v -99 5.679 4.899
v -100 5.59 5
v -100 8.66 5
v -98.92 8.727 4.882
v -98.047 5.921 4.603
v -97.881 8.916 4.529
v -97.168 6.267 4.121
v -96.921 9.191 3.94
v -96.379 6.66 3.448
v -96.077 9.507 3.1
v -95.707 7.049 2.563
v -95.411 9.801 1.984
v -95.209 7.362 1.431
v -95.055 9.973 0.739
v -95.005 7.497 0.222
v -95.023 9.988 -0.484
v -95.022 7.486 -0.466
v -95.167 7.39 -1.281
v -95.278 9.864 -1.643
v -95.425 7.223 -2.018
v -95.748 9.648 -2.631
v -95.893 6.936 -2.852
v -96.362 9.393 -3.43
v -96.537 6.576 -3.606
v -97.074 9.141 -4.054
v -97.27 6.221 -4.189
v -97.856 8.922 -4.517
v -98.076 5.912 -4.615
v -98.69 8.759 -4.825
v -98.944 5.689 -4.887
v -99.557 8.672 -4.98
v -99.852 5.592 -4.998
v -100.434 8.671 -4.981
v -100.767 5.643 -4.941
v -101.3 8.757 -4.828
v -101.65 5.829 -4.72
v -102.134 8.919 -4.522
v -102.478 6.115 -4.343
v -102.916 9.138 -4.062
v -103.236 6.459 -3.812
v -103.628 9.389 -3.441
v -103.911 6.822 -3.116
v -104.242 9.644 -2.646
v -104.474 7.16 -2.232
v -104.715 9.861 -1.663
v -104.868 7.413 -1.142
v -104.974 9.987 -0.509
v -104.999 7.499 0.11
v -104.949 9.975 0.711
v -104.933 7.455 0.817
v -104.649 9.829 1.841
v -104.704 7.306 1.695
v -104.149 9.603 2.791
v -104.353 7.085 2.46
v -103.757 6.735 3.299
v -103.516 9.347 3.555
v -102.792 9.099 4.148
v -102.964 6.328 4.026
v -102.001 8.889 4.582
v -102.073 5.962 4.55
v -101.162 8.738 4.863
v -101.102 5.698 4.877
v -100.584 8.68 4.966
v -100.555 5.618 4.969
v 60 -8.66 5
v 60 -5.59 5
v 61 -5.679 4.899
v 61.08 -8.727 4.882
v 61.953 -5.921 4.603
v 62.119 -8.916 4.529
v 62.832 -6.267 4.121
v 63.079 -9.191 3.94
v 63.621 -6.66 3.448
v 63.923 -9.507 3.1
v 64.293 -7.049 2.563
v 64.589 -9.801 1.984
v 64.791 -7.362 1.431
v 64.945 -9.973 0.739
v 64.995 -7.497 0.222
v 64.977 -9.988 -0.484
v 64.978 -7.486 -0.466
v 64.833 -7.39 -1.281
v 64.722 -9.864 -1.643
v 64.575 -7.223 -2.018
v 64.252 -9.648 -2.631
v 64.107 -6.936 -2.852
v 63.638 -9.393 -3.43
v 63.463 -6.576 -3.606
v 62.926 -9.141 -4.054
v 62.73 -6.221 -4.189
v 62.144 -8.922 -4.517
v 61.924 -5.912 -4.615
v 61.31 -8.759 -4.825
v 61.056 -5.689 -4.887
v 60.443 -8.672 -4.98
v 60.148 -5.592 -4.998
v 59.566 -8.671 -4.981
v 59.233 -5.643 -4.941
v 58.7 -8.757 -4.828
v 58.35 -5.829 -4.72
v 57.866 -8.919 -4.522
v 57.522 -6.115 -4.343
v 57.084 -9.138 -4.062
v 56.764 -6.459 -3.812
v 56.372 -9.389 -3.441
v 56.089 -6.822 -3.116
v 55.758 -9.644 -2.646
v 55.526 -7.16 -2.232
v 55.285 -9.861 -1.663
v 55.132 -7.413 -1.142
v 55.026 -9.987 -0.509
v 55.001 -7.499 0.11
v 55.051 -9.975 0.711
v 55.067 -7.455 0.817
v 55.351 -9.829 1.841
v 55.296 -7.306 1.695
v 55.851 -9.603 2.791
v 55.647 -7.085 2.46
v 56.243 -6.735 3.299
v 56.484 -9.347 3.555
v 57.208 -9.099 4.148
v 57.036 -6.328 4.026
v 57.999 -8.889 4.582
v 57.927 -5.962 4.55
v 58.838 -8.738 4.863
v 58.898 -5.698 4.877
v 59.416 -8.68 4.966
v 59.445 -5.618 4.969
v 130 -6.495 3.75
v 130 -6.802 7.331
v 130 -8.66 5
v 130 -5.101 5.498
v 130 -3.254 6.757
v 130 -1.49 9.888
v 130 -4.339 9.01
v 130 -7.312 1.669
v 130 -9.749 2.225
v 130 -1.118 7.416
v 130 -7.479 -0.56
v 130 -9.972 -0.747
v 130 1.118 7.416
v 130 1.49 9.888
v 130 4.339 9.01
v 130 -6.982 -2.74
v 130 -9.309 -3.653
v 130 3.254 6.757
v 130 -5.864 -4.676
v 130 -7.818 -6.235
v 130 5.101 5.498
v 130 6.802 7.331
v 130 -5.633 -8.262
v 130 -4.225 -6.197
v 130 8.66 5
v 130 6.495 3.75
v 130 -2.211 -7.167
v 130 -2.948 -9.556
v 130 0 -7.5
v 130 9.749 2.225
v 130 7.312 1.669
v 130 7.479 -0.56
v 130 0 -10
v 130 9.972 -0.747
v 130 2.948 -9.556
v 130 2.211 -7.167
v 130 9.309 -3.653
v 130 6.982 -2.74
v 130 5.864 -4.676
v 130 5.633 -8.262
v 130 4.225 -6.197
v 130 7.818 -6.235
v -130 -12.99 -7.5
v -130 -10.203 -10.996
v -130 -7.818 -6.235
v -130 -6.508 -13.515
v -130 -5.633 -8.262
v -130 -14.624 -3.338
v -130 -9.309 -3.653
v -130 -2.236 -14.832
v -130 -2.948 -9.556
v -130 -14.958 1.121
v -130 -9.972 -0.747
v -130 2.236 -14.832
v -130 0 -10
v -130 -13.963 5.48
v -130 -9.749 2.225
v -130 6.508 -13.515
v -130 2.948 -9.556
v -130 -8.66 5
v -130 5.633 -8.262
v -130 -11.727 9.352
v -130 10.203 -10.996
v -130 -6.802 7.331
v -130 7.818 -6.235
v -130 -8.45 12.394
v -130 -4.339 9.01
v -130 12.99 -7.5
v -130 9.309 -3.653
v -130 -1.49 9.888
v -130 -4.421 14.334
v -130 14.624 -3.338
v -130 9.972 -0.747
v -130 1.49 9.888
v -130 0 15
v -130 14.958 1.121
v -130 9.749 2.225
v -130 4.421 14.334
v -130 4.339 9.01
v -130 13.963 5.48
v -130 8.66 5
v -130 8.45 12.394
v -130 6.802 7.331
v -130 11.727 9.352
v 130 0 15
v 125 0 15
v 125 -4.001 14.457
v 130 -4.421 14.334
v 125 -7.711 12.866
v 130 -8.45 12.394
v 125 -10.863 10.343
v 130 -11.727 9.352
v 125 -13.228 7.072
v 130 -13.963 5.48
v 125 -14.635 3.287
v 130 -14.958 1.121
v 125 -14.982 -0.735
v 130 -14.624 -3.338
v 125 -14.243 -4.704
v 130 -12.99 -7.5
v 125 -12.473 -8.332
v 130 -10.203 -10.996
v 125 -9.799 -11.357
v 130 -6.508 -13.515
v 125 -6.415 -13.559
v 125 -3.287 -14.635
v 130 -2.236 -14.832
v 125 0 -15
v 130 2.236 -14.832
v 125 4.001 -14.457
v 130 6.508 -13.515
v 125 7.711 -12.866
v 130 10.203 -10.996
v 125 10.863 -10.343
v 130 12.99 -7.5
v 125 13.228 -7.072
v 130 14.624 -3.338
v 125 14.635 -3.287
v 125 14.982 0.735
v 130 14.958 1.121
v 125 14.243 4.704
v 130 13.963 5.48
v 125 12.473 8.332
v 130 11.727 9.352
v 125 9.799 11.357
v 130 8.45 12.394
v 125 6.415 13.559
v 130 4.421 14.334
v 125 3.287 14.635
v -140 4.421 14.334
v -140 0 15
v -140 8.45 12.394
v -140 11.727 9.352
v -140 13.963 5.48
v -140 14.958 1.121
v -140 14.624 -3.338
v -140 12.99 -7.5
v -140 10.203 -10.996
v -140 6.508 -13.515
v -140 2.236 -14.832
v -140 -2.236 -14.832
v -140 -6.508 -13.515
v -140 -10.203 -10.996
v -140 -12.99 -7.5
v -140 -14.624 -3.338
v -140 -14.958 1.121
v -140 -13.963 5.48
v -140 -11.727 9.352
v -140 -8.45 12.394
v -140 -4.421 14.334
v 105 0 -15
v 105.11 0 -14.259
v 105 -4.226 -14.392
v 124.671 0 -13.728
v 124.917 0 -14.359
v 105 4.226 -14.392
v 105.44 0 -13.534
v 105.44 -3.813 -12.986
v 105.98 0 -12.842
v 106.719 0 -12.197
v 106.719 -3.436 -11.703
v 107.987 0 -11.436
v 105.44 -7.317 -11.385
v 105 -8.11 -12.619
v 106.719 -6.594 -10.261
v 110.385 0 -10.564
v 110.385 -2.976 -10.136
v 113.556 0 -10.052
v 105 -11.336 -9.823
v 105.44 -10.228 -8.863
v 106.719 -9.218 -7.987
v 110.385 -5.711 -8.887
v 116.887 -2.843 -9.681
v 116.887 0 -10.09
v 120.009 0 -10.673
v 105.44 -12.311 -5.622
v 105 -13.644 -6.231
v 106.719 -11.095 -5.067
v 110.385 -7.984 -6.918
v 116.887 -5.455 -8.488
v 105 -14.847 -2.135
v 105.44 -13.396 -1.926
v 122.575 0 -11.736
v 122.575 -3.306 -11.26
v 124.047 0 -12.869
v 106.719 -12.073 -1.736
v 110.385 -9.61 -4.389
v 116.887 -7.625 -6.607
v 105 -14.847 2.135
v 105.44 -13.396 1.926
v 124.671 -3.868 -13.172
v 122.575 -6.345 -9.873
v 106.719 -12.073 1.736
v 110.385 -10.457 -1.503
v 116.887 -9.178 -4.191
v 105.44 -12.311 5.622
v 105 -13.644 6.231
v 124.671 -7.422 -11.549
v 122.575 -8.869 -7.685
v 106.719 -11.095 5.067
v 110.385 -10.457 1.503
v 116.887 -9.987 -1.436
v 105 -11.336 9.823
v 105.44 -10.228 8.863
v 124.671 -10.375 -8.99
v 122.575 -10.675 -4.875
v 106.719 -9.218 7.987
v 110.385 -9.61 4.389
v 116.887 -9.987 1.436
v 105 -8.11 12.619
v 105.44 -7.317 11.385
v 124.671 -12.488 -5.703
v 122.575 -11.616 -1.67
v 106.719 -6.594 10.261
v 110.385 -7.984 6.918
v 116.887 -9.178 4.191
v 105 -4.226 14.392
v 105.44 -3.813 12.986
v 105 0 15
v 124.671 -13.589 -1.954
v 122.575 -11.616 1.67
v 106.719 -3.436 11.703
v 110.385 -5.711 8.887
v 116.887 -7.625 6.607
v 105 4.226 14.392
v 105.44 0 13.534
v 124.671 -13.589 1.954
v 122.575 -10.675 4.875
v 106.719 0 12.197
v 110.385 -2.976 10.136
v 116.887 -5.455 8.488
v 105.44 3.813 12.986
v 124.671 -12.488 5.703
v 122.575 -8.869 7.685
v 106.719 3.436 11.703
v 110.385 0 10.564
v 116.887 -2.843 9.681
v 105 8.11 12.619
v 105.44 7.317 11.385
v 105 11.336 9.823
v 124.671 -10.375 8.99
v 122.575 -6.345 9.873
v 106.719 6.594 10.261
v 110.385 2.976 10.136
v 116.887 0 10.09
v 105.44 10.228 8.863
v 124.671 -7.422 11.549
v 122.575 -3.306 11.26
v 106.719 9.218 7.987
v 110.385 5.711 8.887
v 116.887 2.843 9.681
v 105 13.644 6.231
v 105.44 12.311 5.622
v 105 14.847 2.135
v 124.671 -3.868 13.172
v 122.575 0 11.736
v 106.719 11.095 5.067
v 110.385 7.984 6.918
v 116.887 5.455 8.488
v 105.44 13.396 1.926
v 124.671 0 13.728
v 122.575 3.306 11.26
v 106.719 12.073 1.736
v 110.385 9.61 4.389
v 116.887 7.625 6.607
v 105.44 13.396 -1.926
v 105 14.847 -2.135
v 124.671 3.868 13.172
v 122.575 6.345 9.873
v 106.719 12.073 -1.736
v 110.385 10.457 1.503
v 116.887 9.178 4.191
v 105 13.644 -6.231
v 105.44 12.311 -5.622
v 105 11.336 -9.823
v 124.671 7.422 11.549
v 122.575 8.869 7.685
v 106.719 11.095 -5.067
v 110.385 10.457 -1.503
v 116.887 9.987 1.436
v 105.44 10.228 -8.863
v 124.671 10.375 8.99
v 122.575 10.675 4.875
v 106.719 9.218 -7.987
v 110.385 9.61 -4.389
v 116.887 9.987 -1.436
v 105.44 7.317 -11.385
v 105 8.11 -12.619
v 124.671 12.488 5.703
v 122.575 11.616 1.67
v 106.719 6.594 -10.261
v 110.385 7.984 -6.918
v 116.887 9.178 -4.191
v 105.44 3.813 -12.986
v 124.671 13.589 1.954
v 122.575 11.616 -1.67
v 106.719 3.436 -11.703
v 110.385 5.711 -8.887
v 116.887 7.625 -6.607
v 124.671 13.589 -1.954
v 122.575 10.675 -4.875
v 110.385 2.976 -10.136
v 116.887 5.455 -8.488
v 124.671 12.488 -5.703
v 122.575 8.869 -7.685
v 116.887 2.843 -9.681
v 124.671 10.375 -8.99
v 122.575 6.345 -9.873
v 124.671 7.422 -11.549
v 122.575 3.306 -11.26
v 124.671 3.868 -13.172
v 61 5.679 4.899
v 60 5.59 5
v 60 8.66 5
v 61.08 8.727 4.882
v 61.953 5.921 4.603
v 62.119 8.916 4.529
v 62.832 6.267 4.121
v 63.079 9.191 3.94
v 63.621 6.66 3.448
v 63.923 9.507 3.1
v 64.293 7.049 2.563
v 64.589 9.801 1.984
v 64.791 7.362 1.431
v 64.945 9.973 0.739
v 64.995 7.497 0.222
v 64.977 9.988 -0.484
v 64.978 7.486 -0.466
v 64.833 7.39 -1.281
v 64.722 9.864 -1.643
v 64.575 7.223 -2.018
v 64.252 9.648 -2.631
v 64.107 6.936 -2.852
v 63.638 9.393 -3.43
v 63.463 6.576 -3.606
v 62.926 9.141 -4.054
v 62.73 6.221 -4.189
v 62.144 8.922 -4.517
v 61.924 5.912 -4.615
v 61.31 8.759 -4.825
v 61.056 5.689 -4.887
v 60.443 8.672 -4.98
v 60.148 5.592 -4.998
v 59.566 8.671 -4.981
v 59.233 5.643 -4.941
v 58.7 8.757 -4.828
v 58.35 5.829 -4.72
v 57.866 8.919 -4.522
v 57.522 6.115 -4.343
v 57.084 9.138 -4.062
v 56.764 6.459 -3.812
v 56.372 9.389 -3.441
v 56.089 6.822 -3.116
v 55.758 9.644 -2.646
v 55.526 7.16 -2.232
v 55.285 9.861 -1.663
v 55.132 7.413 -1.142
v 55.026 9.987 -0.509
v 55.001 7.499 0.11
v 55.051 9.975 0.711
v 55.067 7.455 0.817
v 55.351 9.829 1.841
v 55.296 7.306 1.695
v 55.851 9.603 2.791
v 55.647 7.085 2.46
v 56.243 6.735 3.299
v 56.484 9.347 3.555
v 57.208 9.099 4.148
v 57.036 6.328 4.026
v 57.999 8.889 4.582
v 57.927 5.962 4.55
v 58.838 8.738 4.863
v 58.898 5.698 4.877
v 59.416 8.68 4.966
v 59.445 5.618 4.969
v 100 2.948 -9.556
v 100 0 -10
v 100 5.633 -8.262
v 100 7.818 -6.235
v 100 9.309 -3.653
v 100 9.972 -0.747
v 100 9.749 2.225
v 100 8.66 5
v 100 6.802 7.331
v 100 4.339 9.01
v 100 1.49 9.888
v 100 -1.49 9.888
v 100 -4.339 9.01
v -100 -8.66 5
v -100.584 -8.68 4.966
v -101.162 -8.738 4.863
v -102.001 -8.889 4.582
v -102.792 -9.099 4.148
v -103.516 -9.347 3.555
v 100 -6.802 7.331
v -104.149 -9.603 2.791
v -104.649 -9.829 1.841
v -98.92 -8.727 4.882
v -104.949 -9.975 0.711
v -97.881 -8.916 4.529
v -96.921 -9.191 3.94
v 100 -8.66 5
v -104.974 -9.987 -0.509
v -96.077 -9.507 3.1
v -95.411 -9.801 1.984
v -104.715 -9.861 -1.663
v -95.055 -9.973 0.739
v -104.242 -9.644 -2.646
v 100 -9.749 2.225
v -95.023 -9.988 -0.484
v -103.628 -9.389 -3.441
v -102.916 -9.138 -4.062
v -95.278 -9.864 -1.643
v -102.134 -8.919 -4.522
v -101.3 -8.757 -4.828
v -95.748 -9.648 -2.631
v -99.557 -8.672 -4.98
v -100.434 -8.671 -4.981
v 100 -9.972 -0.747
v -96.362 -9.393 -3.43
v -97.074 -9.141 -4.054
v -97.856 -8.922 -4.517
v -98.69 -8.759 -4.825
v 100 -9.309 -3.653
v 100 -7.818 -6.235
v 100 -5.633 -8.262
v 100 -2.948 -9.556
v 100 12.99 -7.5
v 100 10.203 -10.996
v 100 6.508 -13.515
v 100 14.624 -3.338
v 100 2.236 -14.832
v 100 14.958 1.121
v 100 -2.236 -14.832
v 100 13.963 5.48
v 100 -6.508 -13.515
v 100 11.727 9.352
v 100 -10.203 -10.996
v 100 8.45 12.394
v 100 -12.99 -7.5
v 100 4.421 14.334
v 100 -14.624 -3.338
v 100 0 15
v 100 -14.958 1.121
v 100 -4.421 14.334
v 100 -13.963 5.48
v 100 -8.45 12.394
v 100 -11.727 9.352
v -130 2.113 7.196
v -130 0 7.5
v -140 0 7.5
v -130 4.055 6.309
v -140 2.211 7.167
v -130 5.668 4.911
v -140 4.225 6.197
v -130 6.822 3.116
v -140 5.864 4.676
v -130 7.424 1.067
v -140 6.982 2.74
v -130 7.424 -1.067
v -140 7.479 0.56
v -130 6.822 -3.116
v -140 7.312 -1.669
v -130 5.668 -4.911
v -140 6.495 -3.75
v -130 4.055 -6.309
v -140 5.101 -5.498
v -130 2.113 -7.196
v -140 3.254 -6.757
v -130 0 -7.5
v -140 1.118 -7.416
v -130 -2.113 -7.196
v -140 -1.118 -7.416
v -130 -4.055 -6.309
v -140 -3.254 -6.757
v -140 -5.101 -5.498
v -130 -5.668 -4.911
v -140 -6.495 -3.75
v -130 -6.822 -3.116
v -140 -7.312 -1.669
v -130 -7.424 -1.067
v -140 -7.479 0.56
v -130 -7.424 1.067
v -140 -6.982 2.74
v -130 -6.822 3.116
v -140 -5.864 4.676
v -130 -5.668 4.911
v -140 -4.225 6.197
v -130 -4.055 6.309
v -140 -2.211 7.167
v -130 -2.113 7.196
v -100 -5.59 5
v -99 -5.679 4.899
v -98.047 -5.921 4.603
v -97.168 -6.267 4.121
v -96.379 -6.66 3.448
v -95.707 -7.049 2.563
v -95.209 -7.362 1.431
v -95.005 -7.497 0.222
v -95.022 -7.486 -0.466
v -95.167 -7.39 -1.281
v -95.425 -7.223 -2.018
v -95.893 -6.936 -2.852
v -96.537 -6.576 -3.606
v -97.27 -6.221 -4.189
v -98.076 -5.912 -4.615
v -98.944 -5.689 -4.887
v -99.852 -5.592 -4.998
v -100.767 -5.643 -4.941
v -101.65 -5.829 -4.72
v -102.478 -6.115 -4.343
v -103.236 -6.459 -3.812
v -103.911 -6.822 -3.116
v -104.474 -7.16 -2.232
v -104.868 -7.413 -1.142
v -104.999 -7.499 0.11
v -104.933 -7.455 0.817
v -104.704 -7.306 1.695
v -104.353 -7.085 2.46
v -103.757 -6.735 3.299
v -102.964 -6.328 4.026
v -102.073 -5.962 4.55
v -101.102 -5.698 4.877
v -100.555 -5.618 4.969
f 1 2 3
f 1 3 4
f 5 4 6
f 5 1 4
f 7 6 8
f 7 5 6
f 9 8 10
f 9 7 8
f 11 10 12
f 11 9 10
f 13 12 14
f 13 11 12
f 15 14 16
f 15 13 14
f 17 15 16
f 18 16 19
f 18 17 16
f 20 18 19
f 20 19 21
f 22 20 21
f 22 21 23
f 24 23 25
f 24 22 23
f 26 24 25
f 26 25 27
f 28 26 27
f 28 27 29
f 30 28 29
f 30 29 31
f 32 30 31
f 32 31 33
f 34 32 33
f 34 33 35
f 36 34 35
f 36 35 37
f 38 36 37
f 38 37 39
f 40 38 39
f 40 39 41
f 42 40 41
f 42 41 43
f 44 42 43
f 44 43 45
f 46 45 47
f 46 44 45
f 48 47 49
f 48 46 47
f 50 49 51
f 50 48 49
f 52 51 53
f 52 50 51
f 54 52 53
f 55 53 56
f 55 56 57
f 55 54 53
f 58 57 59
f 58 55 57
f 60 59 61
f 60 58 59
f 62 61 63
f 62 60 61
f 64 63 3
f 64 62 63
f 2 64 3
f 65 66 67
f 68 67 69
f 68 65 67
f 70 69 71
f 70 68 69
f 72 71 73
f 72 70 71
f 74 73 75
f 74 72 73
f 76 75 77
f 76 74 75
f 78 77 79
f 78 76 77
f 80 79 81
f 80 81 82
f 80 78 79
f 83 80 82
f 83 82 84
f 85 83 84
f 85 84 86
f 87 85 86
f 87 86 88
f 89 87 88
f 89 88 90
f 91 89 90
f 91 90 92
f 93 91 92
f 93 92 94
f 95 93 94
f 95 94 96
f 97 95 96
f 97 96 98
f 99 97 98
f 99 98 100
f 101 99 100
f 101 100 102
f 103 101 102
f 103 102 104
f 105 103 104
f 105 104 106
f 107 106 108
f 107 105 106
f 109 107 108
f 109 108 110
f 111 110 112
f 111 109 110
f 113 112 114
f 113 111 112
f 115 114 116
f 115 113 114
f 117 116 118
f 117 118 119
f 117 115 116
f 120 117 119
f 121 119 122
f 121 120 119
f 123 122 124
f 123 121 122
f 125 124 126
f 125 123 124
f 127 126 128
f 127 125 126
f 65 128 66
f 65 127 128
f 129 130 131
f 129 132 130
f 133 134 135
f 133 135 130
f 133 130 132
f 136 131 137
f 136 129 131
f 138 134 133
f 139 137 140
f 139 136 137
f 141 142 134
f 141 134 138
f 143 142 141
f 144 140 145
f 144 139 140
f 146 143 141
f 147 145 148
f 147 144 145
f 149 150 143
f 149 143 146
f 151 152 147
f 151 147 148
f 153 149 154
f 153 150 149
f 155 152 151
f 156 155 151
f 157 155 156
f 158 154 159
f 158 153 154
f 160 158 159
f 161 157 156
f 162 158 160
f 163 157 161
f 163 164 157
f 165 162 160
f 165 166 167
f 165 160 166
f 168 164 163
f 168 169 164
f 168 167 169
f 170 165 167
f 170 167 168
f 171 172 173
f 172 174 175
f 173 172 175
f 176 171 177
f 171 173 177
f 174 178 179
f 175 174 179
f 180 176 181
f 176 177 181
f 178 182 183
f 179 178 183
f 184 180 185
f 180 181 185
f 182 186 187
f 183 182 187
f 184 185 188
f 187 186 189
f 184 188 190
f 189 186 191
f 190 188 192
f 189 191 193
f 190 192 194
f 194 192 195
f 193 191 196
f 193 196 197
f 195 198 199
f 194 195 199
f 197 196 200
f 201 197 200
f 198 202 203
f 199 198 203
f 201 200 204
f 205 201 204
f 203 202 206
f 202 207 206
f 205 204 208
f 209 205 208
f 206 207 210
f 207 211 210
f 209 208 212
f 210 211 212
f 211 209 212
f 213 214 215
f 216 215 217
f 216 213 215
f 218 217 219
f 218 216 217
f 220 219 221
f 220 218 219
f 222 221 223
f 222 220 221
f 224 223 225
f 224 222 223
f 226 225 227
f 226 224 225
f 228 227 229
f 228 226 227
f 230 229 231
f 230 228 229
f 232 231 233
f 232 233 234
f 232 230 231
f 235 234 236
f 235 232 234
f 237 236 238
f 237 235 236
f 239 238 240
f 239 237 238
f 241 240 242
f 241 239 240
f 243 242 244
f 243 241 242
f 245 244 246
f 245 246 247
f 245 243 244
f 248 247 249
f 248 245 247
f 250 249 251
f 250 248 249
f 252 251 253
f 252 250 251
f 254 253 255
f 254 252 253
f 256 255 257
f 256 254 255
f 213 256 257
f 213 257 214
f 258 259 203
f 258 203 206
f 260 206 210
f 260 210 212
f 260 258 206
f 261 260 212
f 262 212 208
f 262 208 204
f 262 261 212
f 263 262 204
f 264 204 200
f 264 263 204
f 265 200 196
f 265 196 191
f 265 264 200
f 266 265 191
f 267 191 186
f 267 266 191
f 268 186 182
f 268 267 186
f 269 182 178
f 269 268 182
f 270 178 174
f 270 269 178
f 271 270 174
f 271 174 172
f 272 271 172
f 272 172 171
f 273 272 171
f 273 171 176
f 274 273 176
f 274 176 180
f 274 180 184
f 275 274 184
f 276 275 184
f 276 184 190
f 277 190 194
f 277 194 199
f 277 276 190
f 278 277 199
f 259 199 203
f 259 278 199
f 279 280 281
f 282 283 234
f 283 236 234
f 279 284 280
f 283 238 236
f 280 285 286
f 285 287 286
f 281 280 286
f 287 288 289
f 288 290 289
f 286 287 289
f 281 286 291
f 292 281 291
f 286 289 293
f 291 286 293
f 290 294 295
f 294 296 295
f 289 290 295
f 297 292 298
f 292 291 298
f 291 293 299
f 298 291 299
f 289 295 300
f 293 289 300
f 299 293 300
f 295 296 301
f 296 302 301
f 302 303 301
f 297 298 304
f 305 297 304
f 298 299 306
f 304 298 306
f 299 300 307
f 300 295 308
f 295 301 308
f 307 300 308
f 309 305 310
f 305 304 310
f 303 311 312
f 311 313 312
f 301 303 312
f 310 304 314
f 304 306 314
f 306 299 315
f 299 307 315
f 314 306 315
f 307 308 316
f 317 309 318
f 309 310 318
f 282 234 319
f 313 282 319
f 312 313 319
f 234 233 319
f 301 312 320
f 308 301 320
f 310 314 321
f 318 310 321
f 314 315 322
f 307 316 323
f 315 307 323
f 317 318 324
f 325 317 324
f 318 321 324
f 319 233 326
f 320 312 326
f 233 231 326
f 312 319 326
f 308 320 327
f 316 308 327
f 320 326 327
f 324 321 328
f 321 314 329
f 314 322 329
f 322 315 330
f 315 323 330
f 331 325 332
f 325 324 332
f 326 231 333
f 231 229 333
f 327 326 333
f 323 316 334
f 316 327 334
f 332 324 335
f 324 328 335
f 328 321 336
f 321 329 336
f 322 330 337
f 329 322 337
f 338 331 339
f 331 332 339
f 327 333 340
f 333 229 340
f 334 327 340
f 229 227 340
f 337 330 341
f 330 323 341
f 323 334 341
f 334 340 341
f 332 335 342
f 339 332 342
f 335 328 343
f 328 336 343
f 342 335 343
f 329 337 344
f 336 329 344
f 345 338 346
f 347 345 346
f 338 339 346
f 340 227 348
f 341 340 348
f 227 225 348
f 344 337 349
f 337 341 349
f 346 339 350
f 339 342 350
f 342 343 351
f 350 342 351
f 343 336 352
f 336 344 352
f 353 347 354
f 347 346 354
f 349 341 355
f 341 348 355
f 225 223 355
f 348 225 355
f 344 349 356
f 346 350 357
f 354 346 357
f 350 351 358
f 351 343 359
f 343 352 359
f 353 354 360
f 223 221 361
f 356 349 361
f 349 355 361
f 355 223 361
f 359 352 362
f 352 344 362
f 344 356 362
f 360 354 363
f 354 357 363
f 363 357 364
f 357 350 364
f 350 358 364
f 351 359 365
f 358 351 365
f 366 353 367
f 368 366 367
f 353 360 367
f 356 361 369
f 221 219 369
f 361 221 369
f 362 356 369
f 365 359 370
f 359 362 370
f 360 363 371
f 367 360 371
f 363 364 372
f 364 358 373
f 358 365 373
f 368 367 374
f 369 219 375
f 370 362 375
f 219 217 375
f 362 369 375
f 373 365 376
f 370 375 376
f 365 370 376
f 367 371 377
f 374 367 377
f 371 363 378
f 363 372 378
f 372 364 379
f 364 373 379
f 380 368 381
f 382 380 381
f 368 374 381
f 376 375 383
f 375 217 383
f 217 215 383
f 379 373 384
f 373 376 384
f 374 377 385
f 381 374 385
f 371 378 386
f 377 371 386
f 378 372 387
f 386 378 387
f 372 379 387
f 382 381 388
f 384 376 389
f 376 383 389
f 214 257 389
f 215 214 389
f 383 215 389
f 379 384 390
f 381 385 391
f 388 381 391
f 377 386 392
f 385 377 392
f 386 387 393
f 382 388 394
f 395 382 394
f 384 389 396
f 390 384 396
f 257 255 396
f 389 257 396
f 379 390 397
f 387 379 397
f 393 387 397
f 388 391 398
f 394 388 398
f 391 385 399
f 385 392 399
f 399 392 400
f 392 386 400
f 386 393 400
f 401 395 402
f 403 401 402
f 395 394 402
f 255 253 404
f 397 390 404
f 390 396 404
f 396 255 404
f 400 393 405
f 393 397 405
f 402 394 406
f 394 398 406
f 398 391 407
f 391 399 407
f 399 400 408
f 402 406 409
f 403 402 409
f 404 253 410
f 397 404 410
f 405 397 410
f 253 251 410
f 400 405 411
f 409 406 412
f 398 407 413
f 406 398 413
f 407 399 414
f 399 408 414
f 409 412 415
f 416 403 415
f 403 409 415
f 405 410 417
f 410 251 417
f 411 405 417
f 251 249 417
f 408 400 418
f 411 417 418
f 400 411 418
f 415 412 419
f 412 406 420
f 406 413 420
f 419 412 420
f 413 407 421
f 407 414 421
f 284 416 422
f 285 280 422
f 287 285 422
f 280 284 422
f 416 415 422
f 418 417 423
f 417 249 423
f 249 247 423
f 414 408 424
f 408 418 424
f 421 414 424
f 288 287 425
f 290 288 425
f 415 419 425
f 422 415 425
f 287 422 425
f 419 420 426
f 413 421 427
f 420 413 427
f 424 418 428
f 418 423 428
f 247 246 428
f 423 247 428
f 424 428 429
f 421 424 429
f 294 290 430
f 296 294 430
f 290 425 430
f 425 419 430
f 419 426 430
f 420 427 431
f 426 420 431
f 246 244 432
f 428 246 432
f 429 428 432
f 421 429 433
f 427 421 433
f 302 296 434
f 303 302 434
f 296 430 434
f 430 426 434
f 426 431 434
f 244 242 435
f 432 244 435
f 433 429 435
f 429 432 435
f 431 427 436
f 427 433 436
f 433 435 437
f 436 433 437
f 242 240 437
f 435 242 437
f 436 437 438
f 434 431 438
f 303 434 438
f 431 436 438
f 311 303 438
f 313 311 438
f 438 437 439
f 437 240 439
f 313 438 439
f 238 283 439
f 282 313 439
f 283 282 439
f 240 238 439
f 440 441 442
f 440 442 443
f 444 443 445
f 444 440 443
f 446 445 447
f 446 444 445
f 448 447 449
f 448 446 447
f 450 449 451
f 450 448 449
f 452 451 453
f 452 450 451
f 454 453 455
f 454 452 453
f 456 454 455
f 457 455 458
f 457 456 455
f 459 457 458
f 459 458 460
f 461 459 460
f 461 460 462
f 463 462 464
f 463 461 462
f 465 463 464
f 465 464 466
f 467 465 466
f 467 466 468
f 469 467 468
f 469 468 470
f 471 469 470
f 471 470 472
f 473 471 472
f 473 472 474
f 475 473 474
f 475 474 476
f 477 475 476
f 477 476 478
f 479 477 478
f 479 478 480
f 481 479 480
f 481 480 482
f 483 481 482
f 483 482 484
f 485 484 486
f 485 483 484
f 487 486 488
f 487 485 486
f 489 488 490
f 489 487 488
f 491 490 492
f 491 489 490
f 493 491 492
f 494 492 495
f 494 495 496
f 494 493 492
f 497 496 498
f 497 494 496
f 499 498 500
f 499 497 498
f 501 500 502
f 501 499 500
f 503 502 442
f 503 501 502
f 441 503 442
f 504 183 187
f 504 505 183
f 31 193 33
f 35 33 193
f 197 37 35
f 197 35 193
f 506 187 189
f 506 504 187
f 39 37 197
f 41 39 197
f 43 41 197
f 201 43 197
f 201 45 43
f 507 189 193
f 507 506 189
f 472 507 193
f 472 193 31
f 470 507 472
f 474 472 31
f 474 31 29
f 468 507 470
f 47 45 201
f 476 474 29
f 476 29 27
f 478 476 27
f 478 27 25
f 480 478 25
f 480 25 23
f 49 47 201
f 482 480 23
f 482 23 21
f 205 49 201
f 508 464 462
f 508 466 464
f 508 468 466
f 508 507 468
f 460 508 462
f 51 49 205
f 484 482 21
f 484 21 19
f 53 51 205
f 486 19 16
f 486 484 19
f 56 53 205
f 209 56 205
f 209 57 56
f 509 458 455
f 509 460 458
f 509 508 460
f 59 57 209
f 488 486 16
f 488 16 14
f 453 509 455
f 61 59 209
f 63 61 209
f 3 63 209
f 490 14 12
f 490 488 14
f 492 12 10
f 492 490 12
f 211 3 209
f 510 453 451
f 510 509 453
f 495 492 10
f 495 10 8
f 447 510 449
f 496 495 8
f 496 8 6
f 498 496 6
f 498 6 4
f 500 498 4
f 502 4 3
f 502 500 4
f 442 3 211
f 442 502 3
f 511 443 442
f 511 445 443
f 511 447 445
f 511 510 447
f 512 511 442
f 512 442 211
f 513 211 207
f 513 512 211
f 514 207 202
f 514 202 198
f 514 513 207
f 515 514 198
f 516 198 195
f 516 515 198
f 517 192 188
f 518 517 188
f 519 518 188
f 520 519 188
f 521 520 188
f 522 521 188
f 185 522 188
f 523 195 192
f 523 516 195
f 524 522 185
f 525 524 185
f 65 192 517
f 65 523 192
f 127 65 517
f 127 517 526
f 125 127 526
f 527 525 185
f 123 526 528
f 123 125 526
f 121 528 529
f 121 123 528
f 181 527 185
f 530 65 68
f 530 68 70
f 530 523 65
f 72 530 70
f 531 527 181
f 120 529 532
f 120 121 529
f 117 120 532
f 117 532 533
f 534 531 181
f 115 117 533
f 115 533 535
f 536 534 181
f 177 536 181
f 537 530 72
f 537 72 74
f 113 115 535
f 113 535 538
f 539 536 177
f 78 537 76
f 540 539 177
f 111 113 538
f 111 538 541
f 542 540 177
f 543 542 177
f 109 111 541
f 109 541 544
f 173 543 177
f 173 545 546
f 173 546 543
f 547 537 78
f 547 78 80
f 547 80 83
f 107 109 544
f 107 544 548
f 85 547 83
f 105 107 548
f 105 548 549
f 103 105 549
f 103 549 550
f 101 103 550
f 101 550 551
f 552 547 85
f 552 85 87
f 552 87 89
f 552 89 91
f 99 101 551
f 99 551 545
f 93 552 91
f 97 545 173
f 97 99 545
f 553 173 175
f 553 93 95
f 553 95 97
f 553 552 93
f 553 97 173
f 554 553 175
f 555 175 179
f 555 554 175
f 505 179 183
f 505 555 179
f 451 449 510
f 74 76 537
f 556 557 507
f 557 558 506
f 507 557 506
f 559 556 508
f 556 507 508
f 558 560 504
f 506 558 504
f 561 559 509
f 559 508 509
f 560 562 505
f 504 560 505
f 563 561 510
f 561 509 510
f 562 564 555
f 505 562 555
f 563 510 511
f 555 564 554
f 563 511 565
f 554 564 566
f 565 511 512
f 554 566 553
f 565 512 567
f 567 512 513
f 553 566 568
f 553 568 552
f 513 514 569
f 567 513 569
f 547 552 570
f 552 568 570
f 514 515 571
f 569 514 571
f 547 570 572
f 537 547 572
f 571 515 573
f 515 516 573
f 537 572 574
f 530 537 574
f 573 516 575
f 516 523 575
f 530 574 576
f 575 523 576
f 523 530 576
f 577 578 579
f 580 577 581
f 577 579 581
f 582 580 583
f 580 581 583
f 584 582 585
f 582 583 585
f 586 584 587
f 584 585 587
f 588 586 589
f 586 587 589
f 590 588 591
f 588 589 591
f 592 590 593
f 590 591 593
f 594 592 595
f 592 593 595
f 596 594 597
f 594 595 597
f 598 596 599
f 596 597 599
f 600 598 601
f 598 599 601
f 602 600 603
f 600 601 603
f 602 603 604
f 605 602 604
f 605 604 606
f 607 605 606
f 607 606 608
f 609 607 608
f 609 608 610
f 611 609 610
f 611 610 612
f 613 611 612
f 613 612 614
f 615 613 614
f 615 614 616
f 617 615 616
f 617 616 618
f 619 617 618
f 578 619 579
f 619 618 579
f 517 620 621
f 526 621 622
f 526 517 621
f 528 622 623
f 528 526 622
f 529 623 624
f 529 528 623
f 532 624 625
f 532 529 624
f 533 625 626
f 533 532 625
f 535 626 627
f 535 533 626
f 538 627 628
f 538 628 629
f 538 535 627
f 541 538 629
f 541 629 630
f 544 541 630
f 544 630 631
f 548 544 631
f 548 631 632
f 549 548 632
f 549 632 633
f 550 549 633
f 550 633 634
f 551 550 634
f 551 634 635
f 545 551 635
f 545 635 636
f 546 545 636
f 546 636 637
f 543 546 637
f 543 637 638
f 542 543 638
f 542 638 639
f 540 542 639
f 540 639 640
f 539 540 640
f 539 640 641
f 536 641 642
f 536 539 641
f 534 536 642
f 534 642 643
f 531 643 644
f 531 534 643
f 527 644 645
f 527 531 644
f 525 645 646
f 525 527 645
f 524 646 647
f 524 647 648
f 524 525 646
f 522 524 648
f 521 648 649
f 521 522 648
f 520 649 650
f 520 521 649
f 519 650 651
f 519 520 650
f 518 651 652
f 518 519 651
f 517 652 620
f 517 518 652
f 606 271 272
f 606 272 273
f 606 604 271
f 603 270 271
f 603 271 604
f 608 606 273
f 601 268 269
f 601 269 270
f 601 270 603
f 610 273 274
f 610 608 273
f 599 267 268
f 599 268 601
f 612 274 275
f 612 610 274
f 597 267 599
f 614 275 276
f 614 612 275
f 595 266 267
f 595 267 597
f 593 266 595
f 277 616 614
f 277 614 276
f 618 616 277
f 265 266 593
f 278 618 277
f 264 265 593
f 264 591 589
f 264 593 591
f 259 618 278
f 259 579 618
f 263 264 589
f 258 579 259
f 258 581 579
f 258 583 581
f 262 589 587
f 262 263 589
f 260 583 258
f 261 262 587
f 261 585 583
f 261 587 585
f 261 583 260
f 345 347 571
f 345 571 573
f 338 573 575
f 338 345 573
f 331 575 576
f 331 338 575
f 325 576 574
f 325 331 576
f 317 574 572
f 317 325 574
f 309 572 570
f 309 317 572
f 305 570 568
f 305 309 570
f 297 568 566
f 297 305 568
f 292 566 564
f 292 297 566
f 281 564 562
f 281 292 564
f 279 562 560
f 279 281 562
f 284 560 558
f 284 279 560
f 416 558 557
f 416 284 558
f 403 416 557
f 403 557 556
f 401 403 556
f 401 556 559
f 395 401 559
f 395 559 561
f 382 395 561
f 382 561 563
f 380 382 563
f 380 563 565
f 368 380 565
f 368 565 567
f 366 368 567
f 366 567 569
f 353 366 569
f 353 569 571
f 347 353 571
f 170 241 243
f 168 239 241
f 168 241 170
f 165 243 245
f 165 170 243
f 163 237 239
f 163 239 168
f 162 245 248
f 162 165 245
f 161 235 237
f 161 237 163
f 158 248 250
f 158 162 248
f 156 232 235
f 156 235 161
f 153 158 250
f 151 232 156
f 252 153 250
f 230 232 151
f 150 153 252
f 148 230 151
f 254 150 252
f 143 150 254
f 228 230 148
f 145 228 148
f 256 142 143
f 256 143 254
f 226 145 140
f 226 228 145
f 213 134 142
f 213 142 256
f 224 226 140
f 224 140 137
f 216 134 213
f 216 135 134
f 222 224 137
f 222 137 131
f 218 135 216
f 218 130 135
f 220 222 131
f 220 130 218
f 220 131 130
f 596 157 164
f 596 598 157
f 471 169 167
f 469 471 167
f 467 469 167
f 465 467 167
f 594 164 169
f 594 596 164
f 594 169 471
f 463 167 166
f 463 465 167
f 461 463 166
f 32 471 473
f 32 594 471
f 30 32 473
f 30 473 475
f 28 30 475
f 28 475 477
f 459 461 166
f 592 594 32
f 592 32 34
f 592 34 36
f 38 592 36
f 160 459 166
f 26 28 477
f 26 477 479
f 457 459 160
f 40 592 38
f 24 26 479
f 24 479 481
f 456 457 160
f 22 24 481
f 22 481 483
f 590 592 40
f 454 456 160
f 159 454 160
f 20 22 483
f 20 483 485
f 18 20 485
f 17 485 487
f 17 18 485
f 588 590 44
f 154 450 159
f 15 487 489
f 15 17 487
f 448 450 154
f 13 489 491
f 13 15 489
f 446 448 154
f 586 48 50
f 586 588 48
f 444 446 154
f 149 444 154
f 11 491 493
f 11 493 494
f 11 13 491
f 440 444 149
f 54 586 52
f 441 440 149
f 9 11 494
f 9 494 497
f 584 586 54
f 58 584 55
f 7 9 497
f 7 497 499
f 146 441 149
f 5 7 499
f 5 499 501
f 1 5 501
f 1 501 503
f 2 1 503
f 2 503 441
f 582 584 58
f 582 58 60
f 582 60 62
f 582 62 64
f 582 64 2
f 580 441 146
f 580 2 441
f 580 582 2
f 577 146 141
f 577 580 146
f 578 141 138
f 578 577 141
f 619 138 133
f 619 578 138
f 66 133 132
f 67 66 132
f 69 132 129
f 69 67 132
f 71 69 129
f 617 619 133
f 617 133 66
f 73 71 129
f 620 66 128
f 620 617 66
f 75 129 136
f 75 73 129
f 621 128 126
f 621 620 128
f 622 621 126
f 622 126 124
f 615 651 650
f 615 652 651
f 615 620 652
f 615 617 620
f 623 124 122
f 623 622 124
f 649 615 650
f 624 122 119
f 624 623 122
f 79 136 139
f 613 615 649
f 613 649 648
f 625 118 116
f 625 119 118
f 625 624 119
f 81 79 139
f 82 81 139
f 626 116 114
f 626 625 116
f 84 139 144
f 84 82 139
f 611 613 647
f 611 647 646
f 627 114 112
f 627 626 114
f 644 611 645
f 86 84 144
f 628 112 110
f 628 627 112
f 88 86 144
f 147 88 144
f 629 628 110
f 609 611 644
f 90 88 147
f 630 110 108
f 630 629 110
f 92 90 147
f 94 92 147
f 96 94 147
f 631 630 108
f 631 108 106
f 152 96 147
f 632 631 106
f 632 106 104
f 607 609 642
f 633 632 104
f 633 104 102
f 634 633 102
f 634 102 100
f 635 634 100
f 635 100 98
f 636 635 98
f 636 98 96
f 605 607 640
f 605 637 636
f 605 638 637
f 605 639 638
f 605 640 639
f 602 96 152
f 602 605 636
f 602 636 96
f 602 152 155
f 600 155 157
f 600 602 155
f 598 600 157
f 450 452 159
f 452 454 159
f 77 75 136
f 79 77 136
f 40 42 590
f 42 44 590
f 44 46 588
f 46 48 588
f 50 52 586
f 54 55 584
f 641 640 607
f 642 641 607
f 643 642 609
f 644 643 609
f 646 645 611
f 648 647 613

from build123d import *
from build123d.topology import SkipClean

# Parameters (mm, degrees)
CROQUIS1_R                 = 10
CROQUIS1_R_2               = 7.5
SALIENTE_EXTRUIR1_DEPTH    = 130
SALIENTE_EXTRUIR2_START    = 10
CROQUIS2_R                 = 15
CROQUIS2_R_2               = 7.5
SALIENTE_EXTRUIR2_DEPTH    = 10
CORTAR_EXTRUIR1_DEPTH      = 142.598022585
CORTAR_EXTRUIR1_DEPTH_BACK = 142.598022585
CROQUIS3_R                 = 5
CROQUIS4_R                 = 15
CROQUIS4_R_2               = 10
SALIENTE_EXTRUIR3_DEPTH    = 30
CROQUIS5_RX                = 10
CROQUIS5_RY                = 5


with BuildPart() as part:
    # Croquis1 → Saliente-Extruir1 (new, symmetric)
    with BuildSketch(Plane(origin=(0, 0, 0), x_dir=(0, 0, -1), z_dir=(1, 0, 0))):
        Circle(CROQUIS1_R)
        Circle(CROQUIS1_R_2, mode=Mode.SUBTRACT)
    extrude(amount=SALIENTE_EXTRUIR1_DEPTH, both=True)

    # Croquis2 → Saliente-Extruir2 (add)
    with SkipClean():  # the faces are left unmerged after this step: merging them gives an invalid solid
        with BuildSketch(Plane.ZY.offset(130).offset(SALIENTE_EXTRUIR2_START)):
            Circle(CROQUIS2_R)
            Circle(CROQUIS2_R_2, mode=Mode.SUBTRACT)
        extrude(amount=-SALIENTE_EXTRUIR2_DEPTH)

    # Croquis3 → Cortar-Extruir1 (cut, two sides: drawn at the far end of the back side and taken through both)
    with SkipClean():  # the faces are left unmerged after this step: merging them gives an invalid solid
        with BuildSketch(Plane(origin=(0, 0, 0), x_dir=(1, 0, 0), z_dir=(0, 1, 0)).offset(-CORTAR_EXTRUIR1_DEPTH_BACK)):
            with Locations(Location((-100, 0, 0), (0, 0, 270))):
                Circle(CROQUIS3_R)
            with Locations(Location((60, 0, 0), (0, 0, 270))):
                Circle(CROQUIS3_R)
        extrude(amount=CORTAR_EXTRUIR1_DEPTH + CORTAR_EXTRUIR1_DEPTH_BACK, mode=Mode.SUBTRACT)

    # Croquis4 → Saliente-Extruir3 (add)
    with SkipClean():  # the faces are left unmerged after this step: merging them gives an invalid solid
        with BuildSketch(Plane(origin=(130, 0, 0), x_dir=(0, 0, -1), z_dir=(1, 0, 0))):
            with Locations(Location((0, 0, 0), (0, 0, 180))):
                Circle(CROQUIS4_R)
            Circle(CROQUIS4_R_2, mode=Mode.SUBTRACT)
        extrude(amount=-SALIENTE_EXTRUIR3_DEPTH)

    # Croquis5 → Cortar-Revolución1 (revolve, cut)
    with SkipClean():  # the faces are left unmerged after this step: merging them gives an invalid solid
        with BuildSketch(Plane.XY, mode=Mode.PRIVATE) as cortar_revoluci_n1_sk:
            with Locations(Location((115, 15), (0, 0, 180))):
                Ellipse(CROQUIS5_RX, CROQUIS5_RY)
        revolve(cortar_revoluci_n1_sk.sketch.rotate(Axis((130, 0, 0), (-1, 0, 0)), 90), axis=Axis((130, 0, 0), (-1, 0, 0)), mode=Mode.SUBTRACT)


solid = part.part
